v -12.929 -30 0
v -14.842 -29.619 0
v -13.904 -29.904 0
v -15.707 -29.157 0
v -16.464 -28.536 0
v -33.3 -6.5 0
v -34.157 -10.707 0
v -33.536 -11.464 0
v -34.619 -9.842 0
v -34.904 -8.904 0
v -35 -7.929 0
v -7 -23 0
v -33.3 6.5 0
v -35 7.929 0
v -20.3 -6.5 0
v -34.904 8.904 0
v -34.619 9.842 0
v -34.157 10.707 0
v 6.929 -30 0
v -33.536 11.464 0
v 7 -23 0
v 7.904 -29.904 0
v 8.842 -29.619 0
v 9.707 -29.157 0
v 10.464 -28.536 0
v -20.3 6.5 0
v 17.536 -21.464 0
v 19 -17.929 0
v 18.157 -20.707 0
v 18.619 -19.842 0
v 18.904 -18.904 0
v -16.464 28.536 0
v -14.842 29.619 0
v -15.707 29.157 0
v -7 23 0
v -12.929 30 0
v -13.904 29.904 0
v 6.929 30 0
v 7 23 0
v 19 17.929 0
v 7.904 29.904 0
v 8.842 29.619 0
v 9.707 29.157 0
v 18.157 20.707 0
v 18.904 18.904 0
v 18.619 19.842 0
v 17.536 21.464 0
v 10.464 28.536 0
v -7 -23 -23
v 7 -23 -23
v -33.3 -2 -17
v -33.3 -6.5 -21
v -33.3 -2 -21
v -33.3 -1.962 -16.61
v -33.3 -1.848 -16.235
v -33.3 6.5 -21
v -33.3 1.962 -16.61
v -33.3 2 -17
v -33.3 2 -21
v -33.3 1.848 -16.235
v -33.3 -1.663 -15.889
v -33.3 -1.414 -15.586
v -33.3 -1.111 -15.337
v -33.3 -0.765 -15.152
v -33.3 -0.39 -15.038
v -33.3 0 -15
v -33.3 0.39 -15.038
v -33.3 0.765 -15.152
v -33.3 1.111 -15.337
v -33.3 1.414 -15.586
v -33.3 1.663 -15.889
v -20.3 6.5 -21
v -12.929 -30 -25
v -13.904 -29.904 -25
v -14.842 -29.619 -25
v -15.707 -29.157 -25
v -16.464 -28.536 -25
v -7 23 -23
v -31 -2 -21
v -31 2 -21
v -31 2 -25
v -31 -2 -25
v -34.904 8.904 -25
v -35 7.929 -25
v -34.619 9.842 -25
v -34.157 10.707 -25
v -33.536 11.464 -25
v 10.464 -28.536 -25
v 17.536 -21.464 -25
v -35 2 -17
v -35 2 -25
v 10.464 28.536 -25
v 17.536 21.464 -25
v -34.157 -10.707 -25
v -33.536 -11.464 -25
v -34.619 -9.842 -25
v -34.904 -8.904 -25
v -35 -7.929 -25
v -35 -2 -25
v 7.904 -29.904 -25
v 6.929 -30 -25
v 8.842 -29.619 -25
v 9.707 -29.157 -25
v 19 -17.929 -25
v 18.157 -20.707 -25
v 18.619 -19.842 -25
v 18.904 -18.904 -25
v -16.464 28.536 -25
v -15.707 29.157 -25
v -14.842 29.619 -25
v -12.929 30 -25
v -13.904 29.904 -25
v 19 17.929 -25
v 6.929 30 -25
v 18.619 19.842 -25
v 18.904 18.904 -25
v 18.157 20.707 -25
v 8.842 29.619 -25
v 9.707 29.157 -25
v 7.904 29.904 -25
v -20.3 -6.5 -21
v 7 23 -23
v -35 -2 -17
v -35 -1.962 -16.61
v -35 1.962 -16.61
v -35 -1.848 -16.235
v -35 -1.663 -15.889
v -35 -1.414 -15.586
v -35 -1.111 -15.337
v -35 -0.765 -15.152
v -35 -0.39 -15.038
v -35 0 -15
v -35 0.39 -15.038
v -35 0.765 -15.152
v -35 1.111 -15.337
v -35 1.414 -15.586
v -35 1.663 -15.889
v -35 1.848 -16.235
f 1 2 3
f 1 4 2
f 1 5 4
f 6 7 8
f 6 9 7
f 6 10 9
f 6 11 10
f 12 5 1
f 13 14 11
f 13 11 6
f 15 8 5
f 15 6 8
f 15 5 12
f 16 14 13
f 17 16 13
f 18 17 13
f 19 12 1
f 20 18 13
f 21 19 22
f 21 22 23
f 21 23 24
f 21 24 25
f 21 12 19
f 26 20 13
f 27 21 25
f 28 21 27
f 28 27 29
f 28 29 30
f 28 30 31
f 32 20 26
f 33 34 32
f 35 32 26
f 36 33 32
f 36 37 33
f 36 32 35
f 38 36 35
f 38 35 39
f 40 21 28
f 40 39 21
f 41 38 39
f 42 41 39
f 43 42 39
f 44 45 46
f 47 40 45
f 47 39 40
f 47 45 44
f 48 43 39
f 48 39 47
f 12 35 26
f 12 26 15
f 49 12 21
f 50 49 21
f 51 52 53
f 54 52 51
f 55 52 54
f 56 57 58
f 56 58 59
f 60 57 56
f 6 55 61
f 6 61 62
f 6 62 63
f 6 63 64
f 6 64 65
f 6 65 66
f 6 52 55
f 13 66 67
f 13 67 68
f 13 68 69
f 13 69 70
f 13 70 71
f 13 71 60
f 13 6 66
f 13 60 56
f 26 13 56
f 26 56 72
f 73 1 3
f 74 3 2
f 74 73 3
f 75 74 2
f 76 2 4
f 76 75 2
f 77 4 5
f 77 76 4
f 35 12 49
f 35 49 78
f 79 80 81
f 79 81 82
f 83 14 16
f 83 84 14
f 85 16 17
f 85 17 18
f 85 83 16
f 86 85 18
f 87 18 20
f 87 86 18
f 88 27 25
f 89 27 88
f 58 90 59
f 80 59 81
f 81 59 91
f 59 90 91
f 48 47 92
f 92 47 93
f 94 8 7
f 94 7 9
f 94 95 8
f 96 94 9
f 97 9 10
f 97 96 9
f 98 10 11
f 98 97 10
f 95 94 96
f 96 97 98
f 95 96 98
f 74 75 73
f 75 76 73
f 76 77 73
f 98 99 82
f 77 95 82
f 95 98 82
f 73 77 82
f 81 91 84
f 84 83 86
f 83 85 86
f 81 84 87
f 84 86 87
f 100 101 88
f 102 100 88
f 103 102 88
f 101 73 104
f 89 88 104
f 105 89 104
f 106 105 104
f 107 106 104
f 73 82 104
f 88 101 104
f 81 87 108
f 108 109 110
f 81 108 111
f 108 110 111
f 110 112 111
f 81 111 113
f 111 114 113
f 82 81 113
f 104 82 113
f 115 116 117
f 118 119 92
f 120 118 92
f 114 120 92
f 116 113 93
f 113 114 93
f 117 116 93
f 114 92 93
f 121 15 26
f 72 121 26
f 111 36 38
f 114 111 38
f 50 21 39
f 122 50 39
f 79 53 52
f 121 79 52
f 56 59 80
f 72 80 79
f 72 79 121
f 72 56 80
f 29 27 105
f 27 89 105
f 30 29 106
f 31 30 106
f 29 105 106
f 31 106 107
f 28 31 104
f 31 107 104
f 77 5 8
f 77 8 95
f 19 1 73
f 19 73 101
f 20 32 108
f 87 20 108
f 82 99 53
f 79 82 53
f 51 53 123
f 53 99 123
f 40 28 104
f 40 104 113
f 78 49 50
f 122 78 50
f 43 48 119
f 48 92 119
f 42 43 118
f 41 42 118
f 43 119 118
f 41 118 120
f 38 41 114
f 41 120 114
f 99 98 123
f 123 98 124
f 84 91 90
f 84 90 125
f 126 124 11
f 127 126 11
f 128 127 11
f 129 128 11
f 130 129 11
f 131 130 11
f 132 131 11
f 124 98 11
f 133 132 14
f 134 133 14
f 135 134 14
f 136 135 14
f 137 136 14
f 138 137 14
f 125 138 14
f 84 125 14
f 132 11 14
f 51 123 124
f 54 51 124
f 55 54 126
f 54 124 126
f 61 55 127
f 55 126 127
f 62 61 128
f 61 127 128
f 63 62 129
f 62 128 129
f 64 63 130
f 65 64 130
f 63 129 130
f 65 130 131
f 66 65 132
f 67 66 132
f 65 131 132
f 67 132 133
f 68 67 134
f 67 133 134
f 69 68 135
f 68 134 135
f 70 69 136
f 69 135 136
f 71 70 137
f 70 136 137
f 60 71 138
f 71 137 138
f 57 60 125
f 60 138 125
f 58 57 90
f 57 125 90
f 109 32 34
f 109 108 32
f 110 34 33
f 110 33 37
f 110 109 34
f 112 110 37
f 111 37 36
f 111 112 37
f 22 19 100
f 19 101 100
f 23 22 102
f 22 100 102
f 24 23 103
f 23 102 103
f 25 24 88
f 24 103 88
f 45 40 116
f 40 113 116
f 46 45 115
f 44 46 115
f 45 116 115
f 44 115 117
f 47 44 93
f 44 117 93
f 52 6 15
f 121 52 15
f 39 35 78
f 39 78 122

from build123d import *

# Parameters (mm, degrees)
F0_W     = 54
F0_H     = 60
F0_W_2   = 13
F0_H_2   = 13
F0_W_3   = 14
F0_H_3   = 46
F1_DEPTH = 25
F2_DEPTH = 21
F3_DEPTH = 23
F5_DEPTH = 4
F6_SIZE  = 20
F7_SIZE  = 20
F8_SIZE  = 10
F9_R     = 5


with BuildPart() as f1:
    # F0 (on Top) → F1 (new body)
    with BuildSketch(Plane.XY):
        with Locations((-8, 0)):
            Rectangle(F0_W, F0_H)
        with Locations((-26.8, 0)):
            Rectangle(F0_W_2, F0_H_2, mode=Mode.SUBTRACT)
        Rectangle(F0_W_3, F0_H_3, mode=Mode.SUBTRACT)
        with Locations((-26.8, 0)):
            Rectangle(F0_W_2, F0_H_2)
        Rectangle(F0_W_3, F0_H_3)
    extrude(amount=-F1_DEPTH)

    # F0 (on Top) → F2 (cut)
    with BuildSketch(Plane.XY):
        with Locations((-26.8, 0)):
            Rectangle(F0_W_2, F0_H_2)
    extrude(amount=-F2_DEPTH, mode=Mode.SUBTRACT)

    # F0 (on Top) → F3 (cut)
    with BuildSketch(Plane.XY):
        Rectangle(F0_W_3, F0_H_3)
    extrude(amount=-F3_DEPTH, mode=Mode.SUBTRACT)

    # F4 (on face) → F5 (cut)
    with BuildSketch(Plane(origin=(-35, 0, 0), x_dir=(0, -1, 0), z_dir=(-1, 0, 0))):
        with BuildLine():
            Line((-2, -25), (2, -25))
            Line((2, -25), (2, -17))
            ThreePointArc((2, -17), (0, -19), (-2, -17))
            Line((-2, -17), (-2, -25))
        make_face()
        with BuildLine():
            ThreePointArc((-2, -17), (0, -19), (2, -17))
            Line((2, -17), (-2, -17))
        make_face()
        with BuildLine():
            Line((-2, -17), (2, -17))
            ThreePointArc((2, -17), (0, -15), (-2, -17))
        make_face()
    extrude(amount=-F5_DEPTH, mode=Mode.SUBTRACT)

    # F6
    f6_edges = [f1.edges().sort_by_distance(p)[0] for p in [
        (-35, 30, -12.5),
    ]]
    chamfer(f6_edges, length=F6_SIZE)

    # F7
    f7_edges = [f1.edges().sort_by_distance(p)[0] for p in [
        (-35, -30, -12.5),
    ]]
    chamfer(f7_edges, length=F7_SIZE)

    # F8
    f8_edges = [f1.edges().sort_by_distance(p)[0] for p in [
        (19, -30, -12.5),
        (19, 30, -12.5),
    ]]
    chamfer(f8_edges, length=F8_SIZE)

    # F9
    f9_edges = [f1.edges().sort_by_distance(p)[0] for p in [
        (-35, 10, -12.5),
        (-35, -10, -12.5),
        (-15, -30, -12.5),
        (9, -30, -12.5),
        (19, -20, -12.5),
        (19, 20, -12.5),
        (9, 30, -12.5),
        (-15, 30, -12.5),
    ]]
    fillet(f9_edges, radius=F9_R)


solid = f1.part
